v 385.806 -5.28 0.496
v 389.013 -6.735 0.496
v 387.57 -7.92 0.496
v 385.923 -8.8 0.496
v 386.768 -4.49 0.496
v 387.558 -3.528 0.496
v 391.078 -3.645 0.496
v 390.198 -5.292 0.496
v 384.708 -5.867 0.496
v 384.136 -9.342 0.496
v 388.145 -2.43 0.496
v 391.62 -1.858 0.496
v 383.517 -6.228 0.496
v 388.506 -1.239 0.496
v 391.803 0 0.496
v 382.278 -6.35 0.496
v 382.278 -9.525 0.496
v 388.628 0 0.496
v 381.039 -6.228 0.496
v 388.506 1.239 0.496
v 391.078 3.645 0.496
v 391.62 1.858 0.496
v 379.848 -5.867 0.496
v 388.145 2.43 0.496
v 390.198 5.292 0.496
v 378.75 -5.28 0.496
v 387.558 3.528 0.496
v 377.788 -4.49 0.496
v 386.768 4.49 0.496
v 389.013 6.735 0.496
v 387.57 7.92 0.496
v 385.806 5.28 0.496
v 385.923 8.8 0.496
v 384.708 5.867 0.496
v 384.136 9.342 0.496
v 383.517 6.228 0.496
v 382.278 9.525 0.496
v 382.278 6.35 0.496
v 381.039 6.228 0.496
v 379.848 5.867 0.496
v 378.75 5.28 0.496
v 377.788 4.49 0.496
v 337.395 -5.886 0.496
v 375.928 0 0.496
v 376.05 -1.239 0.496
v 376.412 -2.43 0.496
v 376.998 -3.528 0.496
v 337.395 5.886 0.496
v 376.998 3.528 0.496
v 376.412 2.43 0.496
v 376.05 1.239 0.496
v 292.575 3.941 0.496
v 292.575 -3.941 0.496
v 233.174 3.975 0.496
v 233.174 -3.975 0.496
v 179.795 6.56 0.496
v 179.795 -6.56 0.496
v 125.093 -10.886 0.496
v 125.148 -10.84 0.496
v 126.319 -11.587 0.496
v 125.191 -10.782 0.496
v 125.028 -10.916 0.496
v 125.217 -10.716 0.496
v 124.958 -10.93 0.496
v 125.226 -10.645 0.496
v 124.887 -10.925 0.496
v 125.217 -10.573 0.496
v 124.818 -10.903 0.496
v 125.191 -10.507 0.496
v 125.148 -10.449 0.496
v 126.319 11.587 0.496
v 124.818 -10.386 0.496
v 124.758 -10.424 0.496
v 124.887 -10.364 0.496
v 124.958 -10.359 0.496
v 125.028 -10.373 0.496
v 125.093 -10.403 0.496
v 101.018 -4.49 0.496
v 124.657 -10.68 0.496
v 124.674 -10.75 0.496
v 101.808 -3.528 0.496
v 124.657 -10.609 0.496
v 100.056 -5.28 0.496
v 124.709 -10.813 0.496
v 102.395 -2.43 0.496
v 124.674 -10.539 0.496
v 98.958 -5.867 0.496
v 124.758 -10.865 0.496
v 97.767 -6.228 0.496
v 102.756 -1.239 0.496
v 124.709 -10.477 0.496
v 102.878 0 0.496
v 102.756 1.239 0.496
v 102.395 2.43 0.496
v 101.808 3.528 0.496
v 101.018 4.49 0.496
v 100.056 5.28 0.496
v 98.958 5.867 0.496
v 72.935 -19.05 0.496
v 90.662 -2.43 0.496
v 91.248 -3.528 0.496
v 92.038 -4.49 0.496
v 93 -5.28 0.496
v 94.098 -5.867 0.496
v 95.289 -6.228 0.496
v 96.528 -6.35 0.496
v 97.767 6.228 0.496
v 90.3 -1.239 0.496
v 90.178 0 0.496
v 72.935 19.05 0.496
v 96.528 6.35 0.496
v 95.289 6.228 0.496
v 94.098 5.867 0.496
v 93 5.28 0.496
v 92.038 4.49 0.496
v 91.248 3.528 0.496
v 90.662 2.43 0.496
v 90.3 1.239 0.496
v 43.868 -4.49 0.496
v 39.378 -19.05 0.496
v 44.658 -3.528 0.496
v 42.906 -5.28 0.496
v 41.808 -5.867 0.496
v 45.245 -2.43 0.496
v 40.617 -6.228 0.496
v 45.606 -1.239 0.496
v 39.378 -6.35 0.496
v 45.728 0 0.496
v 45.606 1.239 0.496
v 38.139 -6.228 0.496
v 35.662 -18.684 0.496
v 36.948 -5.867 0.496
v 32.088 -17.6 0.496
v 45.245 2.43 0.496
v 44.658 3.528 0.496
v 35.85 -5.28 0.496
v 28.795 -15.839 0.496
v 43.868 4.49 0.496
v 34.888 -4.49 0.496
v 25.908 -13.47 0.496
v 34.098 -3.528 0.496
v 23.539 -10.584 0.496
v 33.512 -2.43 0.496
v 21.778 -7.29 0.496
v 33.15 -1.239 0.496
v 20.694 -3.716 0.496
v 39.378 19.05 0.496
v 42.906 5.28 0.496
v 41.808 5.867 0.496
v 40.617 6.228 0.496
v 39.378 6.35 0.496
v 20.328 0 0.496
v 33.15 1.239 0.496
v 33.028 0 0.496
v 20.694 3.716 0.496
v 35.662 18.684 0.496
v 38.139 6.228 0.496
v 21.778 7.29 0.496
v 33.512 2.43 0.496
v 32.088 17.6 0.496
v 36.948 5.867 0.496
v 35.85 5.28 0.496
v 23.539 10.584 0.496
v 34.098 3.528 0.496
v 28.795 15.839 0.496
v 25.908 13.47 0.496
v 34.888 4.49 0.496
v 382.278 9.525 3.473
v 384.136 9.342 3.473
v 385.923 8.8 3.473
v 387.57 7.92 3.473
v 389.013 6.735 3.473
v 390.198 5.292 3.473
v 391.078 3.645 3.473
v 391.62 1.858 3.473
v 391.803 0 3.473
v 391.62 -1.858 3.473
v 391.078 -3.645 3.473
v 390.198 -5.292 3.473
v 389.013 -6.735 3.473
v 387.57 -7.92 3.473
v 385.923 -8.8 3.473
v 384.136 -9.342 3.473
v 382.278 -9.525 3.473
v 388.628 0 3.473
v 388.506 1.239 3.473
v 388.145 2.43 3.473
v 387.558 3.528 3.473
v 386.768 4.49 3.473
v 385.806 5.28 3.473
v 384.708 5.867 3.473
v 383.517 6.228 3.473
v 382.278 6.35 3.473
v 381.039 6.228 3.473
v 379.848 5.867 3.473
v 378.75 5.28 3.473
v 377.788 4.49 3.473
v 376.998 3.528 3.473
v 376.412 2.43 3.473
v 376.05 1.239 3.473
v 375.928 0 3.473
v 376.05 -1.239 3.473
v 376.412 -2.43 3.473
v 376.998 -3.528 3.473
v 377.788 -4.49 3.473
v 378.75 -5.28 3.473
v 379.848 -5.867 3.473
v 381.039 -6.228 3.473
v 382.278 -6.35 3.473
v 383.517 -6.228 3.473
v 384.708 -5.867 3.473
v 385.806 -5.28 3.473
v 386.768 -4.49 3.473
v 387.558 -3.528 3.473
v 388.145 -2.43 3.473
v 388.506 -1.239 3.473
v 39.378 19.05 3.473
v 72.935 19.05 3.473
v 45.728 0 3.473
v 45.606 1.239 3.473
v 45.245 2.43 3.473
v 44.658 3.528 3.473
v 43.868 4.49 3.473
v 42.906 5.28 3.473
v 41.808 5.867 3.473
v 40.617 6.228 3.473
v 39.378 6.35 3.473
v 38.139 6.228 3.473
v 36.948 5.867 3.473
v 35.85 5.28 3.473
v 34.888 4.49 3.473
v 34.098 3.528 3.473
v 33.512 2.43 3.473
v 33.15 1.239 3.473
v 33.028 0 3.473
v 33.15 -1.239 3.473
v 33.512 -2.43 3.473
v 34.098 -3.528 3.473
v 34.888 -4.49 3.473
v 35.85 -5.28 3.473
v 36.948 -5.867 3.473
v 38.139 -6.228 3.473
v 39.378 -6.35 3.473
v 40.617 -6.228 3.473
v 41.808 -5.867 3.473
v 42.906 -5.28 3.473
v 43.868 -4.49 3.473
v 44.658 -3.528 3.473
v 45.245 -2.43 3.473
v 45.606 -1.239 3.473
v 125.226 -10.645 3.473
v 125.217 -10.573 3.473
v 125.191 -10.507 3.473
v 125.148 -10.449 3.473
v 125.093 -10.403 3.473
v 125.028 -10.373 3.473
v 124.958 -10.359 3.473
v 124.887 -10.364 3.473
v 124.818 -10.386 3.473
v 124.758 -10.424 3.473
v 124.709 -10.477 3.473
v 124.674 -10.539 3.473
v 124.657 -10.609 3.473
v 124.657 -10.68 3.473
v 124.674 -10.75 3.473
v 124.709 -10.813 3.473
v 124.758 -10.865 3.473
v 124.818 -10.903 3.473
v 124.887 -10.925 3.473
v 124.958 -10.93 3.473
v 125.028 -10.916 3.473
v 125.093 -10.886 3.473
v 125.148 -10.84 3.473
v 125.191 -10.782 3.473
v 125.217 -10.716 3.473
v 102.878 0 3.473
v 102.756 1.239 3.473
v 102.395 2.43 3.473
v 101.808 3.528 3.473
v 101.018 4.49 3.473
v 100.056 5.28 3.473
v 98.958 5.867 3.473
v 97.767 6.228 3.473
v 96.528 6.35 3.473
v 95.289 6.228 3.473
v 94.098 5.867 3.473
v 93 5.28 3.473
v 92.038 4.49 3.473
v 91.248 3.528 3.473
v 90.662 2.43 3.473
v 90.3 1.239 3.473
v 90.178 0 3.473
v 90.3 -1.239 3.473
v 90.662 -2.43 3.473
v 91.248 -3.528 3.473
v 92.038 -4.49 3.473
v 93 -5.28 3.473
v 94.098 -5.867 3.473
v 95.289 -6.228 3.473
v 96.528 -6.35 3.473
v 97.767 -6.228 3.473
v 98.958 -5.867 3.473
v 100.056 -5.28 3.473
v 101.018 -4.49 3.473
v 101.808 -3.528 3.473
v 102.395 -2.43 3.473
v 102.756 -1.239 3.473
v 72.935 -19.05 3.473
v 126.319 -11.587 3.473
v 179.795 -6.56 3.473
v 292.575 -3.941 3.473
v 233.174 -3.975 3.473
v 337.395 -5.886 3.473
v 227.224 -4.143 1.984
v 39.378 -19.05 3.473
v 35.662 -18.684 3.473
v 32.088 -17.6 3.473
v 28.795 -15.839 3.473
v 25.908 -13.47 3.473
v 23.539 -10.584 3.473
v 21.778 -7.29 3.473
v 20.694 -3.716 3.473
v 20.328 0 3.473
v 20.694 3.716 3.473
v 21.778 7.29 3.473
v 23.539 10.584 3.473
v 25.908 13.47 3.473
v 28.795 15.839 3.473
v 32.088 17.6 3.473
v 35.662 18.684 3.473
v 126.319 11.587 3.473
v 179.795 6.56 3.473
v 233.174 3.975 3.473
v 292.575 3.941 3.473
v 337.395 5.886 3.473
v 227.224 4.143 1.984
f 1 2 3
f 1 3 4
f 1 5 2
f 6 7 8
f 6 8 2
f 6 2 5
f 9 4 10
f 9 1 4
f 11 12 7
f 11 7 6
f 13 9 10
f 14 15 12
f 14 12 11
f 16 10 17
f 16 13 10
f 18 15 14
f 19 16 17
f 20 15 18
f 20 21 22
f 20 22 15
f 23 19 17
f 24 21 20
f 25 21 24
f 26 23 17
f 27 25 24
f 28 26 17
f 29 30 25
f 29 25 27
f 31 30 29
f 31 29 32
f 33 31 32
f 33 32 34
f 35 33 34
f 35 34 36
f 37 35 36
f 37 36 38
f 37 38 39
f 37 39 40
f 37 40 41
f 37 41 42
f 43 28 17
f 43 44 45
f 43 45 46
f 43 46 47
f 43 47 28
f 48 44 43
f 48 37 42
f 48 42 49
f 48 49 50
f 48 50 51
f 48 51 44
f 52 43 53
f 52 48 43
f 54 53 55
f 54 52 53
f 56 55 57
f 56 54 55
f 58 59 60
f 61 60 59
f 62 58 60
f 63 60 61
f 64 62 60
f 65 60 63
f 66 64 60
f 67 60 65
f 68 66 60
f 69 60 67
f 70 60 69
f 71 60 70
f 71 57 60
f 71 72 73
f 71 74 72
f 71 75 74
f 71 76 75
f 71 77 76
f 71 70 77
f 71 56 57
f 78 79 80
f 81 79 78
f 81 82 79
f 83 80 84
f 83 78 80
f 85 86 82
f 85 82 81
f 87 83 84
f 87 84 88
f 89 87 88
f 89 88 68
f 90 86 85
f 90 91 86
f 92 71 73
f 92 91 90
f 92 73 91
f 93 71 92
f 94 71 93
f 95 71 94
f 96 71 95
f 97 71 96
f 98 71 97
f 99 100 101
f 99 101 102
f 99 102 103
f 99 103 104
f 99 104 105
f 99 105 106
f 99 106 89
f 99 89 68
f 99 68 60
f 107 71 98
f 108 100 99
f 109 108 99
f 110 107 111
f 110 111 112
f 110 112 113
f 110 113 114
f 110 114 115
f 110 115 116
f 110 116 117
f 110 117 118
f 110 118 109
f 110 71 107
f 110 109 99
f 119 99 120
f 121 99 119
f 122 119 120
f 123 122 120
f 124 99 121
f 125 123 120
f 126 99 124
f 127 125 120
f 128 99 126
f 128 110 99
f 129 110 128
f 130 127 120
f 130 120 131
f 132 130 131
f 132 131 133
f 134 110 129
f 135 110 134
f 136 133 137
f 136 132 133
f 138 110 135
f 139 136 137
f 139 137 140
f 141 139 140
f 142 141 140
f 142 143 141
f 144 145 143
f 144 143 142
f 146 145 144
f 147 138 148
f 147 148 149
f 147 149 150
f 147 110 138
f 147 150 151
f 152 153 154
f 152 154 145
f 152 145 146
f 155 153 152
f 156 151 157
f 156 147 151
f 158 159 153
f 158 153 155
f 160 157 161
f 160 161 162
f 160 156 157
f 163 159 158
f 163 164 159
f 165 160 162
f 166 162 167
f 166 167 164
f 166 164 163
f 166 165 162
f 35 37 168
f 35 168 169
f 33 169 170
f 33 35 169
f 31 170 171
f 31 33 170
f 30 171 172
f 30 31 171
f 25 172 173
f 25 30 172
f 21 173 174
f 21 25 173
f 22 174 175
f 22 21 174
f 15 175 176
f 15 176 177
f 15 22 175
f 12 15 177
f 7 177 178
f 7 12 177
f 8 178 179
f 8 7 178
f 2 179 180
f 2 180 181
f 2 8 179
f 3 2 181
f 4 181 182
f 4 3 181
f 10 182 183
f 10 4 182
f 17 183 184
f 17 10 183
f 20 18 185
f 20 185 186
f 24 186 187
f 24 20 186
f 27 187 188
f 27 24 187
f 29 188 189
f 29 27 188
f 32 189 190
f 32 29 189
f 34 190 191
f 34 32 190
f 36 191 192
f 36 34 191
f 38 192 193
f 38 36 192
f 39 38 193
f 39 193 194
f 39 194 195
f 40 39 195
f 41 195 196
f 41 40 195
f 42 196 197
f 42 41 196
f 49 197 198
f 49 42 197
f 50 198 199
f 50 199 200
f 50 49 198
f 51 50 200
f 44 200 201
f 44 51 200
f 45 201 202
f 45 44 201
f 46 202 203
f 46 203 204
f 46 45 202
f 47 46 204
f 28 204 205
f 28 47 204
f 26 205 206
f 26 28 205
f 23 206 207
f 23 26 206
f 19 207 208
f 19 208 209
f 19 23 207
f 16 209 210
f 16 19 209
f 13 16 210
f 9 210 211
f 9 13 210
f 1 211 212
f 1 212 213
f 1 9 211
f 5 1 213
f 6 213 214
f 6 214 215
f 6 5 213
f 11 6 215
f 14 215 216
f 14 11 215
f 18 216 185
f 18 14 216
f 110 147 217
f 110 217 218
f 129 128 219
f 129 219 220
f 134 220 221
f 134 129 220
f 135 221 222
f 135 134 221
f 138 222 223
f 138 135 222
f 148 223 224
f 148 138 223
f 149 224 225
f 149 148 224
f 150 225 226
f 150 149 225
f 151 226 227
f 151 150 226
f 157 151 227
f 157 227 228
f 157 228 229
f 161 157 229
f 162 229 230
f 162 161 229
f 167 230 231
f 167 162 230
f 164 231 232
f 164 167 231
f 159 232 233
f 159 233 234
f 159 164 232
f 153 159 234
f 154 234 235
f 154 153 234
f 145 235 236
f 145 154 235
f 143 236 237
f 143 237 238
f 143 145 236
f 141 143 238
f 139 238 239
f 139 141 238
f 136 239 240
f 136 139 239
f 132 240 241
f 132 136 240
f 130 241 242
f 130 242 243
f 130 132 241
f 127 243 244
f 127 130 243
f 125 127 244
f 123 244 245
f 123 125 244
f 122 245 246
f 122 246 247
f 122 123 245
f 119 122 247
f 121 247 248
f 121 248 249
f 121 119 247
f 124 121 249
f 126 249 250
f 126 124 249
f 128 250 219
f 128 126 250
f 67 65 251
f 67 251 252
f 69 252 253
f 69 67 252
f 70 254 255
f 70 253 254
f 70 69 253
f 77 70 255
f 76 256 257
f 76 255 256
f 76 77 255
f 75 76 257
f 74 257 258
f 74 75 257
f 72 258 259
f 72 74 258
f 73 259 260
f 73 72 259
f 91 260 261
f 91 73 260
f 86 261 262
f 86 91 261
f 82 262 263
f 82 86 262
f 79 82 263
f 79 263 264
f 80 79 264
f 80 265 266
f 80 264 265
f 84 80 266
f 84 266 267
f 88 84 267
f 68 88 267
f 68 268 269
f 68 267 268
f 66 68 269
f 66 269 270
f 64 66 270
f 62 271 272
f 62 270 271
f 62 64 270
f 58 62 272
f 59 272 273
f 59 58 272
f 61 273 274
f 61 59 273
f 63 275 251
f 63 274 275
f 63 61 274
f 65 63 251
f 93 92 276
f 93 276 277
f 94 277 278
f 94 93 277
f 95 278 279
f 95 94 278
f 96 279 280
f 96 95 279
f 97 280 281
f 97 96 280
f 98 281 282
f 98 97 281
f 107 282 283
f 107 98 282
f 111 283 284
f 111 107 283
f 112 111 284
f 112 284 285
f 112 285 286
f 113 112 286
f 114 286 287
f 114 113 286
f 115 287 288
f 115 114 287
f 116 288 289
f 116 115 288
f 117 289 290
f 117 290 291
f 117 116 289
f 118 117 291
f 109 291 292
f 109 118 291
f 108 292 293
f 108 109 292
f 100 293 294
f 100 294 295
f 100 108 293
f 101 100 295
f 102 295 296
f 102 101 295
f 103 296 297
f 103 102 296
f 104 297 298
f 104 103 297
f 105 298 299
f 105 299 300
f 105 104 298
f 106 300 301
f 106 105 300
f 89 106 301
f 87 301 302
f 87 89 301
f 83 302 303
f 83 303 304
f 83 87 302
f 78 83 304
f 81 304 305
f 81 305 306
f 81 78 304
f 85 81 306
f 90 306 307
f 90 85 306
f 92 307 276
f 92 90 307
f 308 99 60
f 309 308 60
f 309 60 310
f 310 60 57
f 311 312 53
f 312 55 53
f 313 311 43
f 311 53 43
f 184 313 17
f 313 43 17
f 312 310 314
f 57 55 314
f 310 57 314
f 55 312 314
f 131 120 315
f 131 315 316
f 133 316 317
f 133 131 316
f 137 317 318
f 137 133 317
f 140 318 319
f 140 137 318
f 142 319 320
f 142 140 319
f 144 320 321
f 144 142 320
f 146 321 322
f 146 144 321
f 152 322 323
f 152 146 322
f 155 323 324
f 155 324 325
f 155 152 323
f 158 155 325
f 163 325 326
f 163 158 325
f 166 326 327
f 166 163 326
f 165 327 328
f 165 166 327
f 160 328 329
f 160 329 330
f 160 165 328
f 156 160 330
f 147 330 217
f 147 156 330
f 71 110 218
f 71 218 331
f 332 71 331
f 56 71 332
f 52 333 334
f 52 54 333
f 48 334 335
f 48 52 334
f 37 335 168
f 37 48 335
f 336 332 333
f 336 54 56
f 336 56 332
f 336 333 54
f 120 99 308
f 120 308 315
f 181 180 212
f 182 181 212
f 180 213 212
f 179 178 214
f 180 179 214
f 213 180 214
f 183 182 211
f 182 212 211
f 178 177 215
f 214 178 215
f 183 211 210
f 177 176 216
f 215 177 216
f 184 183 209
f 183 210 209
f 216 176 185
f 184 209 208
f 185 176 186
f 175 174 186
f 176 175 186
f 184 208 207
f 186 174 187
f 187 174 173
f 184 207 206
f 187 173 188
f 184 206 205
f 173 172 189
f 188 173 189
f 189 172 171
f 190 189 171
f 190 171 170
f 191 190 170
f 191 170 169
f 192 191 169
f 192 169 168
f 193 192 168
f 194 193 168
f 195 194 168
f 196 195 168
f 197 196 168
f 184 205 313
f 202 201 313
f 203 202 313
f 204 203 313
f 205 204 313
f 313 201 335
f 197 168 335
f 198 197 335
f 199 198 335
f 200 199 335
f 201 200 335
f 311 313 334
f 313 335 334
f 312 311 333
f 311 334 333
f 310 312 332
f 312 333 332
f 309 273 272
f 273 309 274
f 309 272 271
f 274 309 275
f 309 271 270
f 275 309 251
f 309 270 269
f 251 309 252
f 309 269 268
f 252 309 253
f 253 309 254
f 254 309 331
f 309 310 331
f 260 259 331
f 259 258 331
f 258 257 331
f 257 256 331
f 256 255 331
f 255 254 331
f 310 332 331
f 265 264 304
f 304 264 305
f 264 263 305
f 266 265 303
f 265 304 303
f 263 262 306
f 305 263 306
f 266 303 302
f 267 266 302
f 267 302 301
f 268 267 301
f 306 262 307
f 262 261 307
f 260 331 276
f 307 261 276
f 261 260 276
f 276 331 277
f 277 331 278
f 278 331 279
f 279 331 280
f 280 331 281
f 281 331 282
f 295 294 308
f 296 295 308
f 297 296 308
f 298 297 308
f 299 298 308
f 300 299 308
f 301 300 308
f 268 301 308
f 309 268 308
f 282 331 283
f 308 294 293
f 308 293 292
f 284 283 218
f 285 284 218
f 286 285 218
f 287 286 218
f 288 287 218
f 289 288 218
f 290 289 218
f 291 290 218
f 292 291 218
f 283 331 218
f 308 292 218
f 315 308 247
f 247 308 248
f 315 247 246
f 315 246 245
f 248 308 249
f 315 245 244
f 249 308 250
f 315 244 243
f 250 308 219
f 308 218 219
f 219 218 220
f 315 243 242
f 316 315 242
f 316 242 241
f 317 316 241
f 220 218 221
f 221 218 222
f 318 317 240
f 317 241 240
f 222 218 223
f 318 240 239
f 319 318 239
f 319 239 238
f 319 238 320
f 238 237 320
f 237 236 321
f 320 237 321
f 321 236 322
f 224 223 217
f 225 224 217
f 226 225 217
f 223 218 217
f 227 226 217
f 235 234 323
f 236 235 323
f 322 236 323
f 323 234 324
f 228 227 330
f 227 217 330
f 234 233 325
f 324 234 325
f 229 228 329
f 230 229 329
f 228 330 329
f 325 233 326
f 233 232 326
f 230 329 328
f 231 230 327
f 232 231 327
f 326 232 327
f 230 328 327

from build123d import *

# Parameters (mm, degrees)
SKETCH4_R               = 8.466666667
BOSS_EXTRUDE2_DEPTH     = 3.96875
SCALE1_SCALE            = 0.75
CUT_EXTRUDE1_DEPTH      = 393.277306545
CUT_EXTRUDE1_DEPTH_BACK = 393.277306545
SKETCH5_R               = 0.28575


with BuildPart() as part:
    # Sketch4 → Boss-Extrude2 (new body)
    with BuildSketch(Plane.XY):
        with BuildLine():
            Line((0, 25.4), (44.742290553, 25.4))
            add(Edge.make_bspline(
                [(44.742290553, 25.4), (249.949853312, -8.0006761), (457.2, 12.7)],
                knots=[0, 0, 0, 1, 1, 1], degree=2))
            ThreePointArc((457.2, 12.7), (469.9, 0), (457.2, -12.7))
            add(Edge.make_bspline(
                [(44.742290553, -25.4), (249.949853312, 8.0006761), (457.2, -12.7)],
                knots=[0, 0, 0, 1, 1, 1], degree=2))
            Line((44.742290553, -25.4), (0, -25.4))
            ThreePointArc((0, -25.4), (-25.4, 0), (0, 25.4))
        make_face()
        Circle(SKETCH4_R, mode=Mode.SUBTRACT)
        with Locations((76.2, 0)):
            Circle(SKETCH4_R, mode=Mode.SUBTRACT)
        with Locations((457.2, 0)):
            Circle(SKETCH4_R, mode=Mode.SUBTRACT)
    extrude(amount=BOSS_EXTRUDE2_DEPTH)


with BuildPart() as part_1:
    # Scale1: scaled about (157.512673369, 0, 1.984375)
    add(part.part.scale(SCALE1_SCALE).moved(Location((39.378168342, 0, 0.49609375))))

    # Sketch5 → Cut-Extrude1 (cut, two sides: drawn at the far end of the back side and taken through both)
    with BuildSketch(Plane.XY.offset(3.47265625).offset(-CUT_EXTRUDE1_DEPTH_BACK)):
        with Locations((124.940154128, -10.64454761)):
            Circle(SKETCH5_R)
    extrude(amount=CUT_EXTRUDE1_DEPTH + CUT_EXTRUDE1_DEPTH_BACK, mode=Mode.SUBTRACT)


solid = part_1.part
